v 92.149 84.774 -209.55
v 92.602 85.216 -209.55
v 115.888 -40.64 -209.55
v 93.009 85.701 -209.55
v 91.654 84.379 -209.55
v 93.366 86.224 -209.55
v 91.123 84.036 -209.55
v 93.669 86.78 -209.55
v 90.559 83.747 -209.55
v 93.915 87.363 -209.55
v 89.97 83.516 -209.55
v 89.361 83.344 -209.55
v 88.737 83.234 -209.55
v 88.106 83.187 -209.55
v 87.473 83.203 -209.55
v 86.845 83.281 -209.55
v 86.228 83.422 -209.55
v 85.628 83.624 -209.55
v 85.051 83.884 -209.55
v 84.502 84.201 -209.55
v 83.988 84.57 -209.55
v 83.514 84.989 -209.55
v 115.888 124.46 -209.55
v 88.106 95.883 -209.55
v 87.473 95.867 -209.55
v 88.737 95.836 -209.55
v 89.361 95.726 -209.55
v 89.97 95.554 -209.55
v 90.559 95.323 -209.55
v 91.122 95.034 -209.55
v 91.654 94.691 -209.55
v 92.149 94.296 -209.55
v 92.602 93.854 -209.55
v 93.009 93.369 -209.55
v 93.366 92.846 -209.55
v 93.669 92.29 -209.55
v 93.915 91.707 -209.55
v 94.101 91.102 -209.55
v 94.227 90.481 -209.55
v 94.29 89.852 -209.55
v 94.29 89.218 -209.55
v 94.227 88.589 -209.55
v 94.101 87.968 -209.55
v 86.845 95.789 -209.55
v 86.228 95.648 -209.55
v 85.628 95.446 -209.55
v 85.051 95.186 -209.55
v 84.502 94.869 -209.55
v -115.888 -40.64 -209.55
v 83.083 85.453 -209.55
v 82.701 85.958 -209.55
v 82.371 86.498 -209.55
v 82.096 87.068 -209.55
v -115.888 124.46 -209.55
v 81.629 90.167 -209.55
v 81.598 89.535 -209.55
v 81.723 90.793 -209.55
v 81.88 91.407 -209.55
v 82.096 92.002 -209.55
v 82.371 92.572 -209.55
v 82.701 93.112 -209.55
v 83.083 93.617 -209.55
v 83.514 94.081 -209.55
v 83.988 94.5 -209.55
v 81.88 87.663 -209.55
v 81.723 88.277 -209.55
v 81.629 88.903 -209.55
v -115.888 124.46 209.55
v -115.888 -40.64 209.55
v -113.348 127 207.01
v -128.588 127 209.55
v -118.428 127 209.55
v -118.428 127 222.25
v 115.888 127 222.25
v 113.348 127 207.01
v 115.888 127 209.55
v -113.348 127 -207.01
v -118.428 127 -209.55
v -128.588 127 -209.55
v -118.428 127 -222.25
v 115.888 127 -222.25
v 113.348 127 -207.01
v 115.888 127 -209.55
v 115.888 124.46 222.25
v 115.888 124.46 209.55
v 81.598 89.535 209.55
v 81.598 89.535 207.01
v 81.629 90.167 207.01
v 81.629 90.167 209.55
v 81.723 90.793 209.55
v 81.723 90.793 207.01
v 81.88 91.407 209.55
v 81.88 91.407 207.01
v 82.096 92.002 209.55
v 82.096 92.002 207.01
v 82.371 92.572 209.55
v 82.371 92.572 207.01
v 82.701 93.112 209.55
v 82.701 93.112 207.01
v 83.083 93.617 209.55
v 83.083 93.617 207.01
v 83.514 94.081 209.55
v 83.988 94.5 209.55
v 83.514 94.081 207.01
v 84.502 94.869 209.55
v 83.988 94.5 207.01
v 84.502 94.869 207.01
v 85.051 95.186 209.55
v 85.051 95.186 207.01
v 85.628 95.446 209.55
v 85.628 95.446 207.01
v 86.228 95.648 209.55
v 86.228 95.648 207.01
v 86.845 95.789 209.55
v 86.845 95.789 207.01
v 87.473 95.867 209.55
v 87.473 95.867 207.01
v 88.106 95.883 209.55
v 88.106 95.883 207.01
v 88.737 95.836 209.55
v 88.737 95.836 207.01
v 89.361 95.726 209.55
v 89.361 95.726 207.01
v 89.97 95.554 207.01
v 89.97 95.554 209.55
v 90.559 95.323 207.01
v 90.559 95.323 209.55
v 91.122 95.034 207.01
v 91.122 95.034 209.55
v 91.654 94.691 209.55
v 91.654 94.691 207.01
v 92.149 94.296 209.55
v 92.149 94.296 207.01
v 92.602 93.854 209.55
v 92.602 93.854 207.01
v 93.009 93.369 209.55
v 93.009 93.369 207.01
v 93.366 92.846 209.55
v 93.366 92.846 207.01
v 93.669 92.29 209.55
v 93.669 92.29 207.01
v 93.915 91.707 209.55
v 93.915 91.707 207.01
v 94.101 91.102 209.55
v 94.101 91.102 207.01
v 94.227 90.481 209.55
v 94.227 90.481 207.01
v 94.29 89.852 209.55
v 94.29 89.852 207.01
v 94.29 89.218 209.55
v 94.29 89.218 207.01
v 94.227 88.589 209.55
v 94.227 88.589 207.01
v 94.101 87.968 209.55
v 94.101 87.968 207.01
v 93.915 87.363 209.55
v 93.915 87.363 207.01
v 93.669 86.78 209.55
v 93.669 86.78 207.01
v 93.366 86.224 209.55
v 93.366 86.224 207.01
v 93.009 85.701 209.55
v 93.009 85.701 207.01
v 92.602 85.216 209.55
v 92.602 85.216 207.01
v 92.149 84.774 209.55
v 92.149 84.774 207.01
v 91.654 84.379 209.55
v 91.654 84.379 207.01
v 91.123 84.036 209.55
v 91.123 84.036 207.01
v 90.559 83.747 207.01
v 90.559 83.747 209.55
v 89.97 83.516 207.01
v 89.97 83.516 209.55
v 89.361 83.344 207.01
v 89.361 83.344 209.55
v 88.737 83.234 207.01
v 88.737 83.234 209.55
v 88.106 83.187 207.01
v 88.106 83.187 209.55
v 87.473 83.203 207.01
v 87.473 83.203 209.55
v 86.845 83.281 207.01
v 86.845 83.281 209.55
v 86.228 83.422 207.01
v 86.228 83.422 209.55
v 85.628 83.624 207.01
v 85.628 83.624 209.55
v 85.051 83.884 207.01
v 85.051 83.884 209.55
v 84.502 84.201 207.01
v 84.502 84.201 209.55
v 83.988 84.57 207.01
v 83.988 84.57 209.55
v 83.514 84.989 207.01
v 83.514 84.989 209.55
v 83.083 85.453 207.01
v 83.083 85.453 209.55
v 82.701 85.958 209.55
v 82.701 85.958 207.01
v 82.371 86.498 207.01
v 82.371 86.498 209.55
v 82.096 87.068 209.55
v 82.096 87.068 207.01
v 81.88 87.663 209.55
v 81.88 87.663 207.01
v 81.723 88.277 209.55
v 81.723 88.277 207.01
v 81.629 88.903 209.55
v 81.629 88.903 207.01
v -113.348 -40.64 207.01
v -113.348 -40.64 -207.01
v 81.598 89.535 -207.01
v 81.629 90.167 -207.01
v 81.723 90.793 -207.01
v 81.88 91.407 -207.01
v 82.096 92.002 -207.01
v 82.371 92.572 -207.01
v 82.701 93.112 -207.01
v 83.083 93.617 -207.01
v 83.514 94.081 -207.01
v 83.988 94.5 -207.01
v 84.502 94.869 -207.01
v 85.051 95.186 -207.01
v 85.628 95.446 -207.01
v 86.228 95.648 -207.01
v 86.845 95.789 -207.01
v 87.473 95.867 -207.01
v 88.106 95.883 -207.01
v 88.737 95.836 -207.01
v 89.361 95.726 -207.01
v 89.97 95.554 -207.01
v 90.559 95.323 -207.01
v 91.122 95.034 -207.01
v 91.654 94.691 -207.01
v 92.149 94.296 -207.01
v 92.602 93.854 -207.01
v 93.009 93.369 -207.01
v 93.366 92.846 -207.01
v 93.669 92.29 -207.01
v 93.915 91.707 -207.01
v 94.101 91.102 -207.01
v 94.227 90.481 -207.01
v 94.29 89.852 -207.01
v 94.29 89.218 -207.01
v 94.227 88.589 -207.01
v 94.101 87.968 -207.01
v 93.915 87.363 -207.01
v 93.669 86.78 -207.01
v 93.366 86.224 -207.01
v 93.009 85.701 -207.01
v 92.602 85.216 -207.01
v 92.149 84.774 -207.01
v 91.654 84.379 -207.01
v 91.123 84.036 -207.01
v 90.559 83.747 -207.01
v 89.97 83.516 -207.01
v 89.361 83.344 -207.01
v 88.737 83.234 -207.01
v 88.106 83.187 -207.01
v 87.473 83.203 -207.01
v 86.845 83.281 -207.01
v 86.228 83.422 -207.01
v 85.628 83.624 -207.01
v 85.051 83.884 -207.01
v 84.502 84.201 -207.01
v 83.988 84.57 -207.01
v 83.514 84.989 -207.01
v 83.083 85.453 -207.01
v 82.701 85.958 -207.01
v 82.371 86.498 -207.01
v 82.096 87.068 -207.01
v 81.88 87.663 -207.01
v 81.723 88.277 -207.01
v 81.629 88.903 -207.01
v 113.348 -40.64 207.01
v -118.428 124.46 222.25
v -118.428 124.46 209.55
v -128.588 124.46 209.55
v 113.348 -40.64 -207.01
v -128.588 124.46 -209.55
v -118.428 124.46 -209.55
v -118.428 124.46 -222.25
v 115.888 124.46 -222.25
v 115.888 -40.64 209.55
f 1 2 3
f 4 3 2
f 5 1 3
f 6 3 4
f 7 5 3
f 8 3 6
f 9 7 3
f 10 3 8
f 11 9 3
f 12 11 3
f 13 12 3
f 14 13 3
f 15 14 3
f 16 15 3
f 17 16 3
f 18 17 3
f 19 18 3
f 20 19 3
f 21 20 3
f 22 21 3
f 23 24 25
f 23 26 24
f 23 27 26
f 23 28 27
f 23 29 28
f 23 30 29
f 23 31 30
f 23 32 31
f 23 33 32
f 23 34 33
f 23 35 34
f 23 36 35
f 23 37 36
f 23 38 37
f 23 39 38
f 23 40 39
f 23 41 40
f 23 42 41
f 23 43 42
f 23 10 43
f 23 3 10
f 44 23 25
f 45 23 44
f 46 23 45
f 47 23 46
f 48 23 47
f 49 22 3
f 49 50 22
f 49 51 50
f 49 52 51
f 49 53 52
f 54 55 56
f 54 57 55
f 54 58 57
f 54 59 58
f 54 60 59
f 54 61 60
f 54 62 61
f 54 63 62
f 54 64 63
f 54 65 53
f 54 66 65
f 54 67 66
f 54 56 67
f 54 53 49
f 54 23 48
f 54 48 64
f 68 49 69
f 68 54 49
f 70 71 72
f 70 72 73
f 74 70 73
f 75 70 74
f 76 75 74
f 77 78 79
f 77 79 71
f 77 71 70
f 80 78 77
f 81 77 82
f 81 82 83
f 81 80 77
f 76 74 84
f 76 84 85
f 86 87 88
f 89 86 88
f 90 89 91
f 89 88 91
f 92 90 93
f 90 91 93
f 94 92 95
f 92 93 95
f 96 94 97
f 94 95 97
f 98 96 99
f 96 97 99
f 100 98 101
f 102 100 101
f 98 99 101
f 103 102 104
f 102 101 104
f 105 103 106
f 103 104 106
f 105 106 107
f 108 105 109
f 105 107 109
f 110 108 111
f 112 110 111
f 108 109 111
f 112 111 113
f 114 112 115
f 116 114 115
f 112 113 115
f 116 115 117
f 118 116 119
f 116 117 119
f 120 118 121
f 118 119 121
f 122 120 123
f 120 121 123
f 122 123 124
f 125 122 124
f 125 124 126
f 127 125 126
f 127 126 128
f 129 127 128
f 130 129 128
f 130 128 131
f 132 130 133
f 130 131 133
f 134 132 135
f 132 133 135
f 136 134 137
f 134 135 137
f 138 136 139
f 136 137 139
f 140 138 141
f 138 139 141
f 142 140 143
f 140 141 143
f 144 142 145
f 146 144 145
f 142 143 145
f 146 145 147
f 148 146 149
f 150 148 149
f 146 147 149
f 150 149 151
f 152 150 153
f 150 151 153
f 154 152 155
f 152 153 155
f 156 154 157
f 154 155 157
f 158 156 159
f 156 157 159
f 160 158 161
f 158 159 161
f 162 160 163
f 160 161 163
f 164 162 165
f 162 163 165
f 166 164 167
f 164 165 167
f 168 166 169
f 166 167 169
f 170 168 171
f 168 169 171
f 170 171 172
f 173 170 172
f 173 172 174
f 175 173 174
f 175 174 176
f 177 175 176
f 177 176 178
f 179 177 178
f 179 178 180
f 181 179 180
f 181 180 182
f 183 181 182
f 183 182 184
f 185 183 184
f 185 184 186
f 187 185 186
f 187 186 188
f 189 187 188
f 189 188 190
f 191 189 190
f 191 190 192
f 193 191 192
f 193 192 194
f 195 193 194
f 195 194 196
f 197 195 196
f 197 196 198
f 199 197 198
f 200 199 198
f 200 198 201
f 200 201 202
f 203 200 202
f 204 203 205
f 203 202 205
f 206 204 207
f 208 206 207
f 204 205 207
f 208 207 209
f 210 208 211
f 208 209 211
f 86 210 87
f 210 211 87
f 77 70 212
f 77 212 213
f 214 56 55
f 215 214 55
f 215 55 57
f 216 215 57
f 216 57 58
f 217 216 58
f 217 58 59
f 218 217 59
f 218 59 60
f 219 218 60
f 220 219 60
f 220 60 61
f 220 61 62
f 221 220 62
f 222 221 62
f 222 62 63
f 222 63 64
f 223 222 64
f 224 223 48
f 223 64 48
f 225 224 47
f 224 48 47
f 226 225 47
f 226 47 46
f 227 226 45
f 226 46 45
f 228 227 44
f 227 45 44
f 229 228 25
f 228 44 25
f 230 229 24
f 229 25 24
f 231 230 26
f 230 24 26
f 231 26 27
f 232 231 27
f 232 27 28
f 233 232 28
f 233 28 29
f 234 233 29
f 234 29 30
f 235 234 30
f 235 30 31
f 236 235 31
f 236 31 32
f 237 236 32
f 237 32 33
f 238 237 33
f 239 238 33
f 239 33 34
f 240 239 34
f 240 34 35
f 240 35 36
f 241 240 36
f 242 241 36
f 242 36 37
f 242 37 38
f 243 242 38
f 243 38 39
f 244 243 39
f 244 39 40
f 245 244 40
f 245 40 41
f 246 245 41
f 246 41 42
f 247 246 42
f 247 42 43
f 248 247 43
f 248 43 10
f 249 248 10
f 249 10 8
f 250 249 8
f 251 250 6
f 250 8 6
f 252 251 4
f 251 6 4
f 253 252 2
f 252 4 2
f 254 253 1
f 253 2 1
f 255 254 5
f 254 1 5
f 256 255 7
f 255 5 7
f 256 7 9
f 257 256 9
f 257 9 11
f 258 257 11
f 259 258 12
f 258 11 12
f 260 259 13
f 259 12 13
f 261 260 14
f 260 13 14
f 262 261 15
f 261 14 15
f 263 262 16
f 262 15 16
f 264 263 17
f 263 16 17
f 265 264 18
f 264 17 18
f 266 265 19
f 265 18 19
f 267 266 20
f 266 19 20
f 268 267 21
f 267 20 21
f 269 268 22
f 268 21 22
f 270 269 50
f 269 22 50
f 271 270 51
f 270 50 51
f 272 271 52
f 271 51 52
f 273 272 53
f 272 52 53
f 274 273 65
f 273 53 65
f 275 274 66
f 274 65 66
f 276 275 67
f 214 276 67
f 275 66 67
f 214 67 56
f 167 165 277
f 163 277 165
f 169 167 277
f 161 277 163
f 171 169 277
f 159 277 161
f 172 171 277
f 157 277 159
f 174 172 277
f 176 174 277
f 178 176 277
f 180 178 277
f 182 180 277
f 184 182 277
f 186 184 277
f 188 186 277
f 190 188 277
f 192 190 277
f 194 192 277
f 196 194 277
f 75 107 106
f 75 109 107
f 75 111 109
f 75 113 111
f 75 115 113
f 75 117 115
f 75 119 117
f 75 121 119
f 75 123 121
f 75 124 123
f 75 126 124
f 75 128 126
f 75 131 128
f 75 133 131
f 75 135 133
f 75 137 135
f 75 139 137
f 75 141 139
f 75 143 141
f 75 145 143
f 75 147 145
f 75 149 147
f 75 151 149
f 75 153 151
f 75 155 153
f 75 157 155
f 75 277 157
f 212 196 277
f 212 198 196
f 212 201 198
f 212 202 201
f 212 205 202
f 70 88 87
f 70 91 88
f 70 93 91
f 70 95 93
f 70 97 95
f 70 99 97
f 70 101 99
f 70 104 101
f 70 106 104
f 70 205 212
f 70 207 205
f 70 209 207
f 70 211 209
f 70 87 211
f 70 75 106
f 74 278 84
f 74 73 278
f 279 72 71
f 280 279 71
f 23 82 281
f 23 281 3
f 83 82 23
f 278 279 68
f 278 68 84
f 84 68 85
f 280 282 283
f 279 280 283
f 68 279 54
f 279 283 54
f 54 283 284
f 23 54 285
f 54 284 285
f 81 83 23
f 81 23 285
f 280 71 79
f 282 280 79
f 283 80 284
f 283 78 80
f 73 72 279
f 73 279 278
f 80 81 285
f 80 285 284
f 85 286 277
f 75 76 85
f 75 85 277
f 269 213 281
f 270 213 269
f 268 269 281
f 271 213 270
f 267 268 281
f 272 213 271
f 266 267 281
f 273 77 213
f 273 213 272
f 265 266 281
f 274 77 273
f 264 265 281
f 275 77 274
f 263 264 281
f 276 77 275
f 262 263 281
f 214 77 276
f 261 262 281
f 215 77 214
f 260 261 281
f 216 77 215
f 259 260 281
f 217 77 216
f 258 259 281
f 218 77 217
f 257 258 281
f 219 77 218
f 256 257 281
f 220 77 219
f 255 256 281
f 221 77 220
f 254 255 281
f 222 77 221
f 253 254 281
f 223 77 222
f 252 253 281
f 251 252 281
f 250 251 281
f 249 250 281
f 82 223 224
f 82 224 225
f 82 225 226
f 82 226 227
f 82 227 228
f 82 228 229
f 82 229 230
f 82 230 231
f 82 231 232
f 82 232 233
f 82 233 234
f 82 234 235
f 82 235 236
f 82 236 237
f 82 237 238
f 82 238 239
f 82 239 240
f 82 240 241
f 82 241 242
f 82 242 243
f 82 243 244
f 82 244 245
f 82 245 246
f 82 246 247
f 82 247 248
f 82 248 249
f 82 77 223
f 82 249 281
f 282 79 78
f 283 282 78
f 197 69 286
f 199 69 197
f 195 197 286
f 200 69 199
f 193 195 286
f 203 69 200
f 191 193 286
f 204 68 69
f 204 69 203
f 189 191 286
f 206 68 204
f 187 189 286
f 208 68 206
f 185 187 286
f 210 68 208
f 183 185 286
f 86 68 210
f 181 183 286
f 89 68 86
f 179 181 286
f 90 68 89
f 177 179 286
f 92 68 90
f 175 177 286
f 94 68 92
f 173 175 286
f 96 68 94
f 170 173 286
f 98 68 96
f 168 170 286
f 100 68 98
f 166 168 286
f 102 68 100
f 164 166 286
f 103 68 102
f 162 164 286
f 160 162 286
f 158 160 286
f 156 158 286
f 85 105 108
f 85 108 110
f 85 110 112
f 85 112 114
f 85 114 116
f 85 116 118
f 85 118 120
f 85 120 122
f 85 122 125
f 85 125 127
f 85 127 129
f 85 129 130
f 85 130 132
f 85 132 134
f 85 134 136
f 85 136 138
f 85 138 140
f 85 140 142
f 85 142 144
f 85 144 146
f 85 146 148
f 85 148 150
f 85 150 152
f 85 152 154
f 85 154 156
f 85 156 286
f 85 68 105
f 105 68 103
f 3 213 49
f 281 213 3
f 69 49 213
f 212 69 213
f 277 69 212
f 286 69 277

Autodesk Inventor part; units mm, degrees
ref_plane "YZ Plane" through (0, 0, 0) normal (1, 0, 0) x (0, 1, 0)
ref_plane "XZ Plane" through (0, 0, 0) normal (0, 1, 0) x (-1, 0, 0)
ref_plane "XY Plane" through (0, 0, 0) normal (0, 0, 1) x (1, 0, 0)
sketch "Sketch1" plane through (0, 0, 0) normal (0, 1, 0) x (-1, 0, 0)
  line L0 (-115.8875, -209.55) -> (115.8875, -209.55)
  line L1 (115.8875, -209.55) -> (115.8875, 209.55)
  line L2 (115.8875, 209.55) -> (-115.8875, 209.55)
  line L3 (-115.8875, -209.55) -> (115.8875, 209.55) construction
  line L4 (115.8875, -209.55) -> (-115.8875, 209.55) construction
  line L5 (113.3475, 207.01) -> (113.3475, -207.01)
  line L6 (113.3475, -207.01) -> (-113.3475, -207.01)
  line L7 (-113.3475, 207.01) -> (113.3475, 207.01)
  line L8 (-113.3475, 207.01) -> (-115.8875, 209.55)
  line L9 (-113.3475, -207.01) -> (-115.8875, -209.55)
  point P0 (0, 0)
  dimension "d0" = 231.775
  dimension "d1" = 419.1
  dimension "d2" = 2.54
extrude "Extrusion1" add sketch "Sketch1" along normal blind 127
sketch "Sketch2" plane through (0, 127, 0) normal (0, 1, 0) x (1, 0, 0)
  line L0 (-115.8875, -209.55) -> (-128.5875, -209.55)
  line L1 (-128.5875, -209.55) -> (-128.5875, 209.55)
  line L2 (-128.5875, 209.55) -> (-115.8875, 209.55)
  line L3 (-115.8875, 209.55) -> (-115.8875, -209.55)
  line L4 (-115.8875, 209.55) -> (115.8875, 209.55)
  line L5 (115.8875, 209.55) -> (115.8875, 222.25)
  line L6 (115.8875, 222.25) -> (-115.8875, 222.25)
  line L7 (-115.8875, 222.25) -> (-115.8875, 209.55)
  line L8 (-115.8875, -209.55) -> (115.8875, -209.55) projected
  line L9 (115.8875, -209.55) -> (-115.8875, -209.55)
  line L10 (-115.8875, -209.55) -> (-115.8875, -222.25)
  line L11 (-115.8875, -222.25) -> (115.8875, -222.25)
  line L12 (115.8875, -222.25) -> (115.8875, -209.55)
  point P0 (0, 0)
  dimension "d5" = 12.7
  dimension "d6" = 419.1
  dimension "d7" = 231.775
  dimension "d8" = 12.7
  dimension "d9" = 12.7
  dimension "d12" = 231.775
extrude "Extrusion2" add sketch "Sketch2" against normal blind 2.54
sketch "Sketch3" plane through (0, 0, 0) normal (0, -1, 0) x (1, 0, 0)
  line L0 (115.8875, -209.55) -> (-115.8875, -209.55) projected
  line L1 (113.3475, -207.01) -> (115.8875, -209.55) projected
  line L2 (-113.3475, -207.01) -> (113.3475, -207.01) projected
  line L3 (-113.3475, 207.01) -> (-113.3475, -207.01) projected
  line L4 (113.3475, 207.01) -> (-113.3475, 207.01) projected
  line L5 (115.8875, 209.55) -> (113.3475, 207.01) projected
  line L6 (-115.8875, 209.55) -> (115.8875, 209.55) projected
  line L7 (-115.8875, -209.55) -> (-115.8875, 209.55) projected
  point P0 (0, 0)
extrude "Extrusion3" add sketch "Sketch3" along normal blind 40.64
sketch "Sketch4" plane through (115.8875, 124.46, -209.55) normal (0, 0, -1) x (-1, 0, 0)
  circle A0 centre (27.94, -34.925) radius 6.35
  line L0 (0, 0) -> (0, -165.1) projected
  line L1 (231.775, 0) -> (0, 0) projected
  circle A1 centre (85.3615, -107.95) radius 99.06 construction
  point P0 (115.8875, -124.46)
  dimension "d15" = 12.7
  dimension "d25" = 27.94
  dimension "d26" = 34.925
extrude "Extrusion4" cut sketch "Sketch4" against normal through all
sketch "Sketch5" plane through (-115.8875, 127, -209.55) normal (0, 0, -1) x (-1, 0, 0)
  line L0 (5.08, -2.54) -> (5.08, 49.46) projected
  line L1 (0, 0) -> (0, -2.54) projected
  line L2 (2.54, -2.54) -> (2.54, -27.94) projected
  line L3 (0, -2.54) -> (0, 0) projected
  line L4 (0, 0) -> (2.54, 0)
  line L5 (2.54, 0) -> (2.54, -2.54)
  line L6 (2.54, -2.54) -> (0, -2.54)
  line L7 (0, -2.54) -> (0, 0)
  point P0 (-115.8875, -127)
extrude "Extrusion5" add sketch "Sketch5" along normal blind 12.7
sketch "Sketch6" plane through (0, 127, 0) normal (0, 1, 0) x (1, 0, 0)
  line L0 (-115.8875, -209.55) -> (-128.5875, -209.55) projected
  line L1 (-115.8875, -209.55) -> (-118.4275, -209.55)
  line L2 (-118.4275, -209.55) -> (-118.4275, -222.25)
  line L3 (-118.4275, -222.25) -> (-115.8875, -222.25)
  line L4 (-115.8875, -222.25) -> (-115.8875, -209.55)
  point P0 (0, 0)
  dimension "d20" = 2.54
extrude "Extrusion6" add sketch "Sketch6" against normal blind 2.54
properties part number "Intake Drop" material "Aluminum 6061"
